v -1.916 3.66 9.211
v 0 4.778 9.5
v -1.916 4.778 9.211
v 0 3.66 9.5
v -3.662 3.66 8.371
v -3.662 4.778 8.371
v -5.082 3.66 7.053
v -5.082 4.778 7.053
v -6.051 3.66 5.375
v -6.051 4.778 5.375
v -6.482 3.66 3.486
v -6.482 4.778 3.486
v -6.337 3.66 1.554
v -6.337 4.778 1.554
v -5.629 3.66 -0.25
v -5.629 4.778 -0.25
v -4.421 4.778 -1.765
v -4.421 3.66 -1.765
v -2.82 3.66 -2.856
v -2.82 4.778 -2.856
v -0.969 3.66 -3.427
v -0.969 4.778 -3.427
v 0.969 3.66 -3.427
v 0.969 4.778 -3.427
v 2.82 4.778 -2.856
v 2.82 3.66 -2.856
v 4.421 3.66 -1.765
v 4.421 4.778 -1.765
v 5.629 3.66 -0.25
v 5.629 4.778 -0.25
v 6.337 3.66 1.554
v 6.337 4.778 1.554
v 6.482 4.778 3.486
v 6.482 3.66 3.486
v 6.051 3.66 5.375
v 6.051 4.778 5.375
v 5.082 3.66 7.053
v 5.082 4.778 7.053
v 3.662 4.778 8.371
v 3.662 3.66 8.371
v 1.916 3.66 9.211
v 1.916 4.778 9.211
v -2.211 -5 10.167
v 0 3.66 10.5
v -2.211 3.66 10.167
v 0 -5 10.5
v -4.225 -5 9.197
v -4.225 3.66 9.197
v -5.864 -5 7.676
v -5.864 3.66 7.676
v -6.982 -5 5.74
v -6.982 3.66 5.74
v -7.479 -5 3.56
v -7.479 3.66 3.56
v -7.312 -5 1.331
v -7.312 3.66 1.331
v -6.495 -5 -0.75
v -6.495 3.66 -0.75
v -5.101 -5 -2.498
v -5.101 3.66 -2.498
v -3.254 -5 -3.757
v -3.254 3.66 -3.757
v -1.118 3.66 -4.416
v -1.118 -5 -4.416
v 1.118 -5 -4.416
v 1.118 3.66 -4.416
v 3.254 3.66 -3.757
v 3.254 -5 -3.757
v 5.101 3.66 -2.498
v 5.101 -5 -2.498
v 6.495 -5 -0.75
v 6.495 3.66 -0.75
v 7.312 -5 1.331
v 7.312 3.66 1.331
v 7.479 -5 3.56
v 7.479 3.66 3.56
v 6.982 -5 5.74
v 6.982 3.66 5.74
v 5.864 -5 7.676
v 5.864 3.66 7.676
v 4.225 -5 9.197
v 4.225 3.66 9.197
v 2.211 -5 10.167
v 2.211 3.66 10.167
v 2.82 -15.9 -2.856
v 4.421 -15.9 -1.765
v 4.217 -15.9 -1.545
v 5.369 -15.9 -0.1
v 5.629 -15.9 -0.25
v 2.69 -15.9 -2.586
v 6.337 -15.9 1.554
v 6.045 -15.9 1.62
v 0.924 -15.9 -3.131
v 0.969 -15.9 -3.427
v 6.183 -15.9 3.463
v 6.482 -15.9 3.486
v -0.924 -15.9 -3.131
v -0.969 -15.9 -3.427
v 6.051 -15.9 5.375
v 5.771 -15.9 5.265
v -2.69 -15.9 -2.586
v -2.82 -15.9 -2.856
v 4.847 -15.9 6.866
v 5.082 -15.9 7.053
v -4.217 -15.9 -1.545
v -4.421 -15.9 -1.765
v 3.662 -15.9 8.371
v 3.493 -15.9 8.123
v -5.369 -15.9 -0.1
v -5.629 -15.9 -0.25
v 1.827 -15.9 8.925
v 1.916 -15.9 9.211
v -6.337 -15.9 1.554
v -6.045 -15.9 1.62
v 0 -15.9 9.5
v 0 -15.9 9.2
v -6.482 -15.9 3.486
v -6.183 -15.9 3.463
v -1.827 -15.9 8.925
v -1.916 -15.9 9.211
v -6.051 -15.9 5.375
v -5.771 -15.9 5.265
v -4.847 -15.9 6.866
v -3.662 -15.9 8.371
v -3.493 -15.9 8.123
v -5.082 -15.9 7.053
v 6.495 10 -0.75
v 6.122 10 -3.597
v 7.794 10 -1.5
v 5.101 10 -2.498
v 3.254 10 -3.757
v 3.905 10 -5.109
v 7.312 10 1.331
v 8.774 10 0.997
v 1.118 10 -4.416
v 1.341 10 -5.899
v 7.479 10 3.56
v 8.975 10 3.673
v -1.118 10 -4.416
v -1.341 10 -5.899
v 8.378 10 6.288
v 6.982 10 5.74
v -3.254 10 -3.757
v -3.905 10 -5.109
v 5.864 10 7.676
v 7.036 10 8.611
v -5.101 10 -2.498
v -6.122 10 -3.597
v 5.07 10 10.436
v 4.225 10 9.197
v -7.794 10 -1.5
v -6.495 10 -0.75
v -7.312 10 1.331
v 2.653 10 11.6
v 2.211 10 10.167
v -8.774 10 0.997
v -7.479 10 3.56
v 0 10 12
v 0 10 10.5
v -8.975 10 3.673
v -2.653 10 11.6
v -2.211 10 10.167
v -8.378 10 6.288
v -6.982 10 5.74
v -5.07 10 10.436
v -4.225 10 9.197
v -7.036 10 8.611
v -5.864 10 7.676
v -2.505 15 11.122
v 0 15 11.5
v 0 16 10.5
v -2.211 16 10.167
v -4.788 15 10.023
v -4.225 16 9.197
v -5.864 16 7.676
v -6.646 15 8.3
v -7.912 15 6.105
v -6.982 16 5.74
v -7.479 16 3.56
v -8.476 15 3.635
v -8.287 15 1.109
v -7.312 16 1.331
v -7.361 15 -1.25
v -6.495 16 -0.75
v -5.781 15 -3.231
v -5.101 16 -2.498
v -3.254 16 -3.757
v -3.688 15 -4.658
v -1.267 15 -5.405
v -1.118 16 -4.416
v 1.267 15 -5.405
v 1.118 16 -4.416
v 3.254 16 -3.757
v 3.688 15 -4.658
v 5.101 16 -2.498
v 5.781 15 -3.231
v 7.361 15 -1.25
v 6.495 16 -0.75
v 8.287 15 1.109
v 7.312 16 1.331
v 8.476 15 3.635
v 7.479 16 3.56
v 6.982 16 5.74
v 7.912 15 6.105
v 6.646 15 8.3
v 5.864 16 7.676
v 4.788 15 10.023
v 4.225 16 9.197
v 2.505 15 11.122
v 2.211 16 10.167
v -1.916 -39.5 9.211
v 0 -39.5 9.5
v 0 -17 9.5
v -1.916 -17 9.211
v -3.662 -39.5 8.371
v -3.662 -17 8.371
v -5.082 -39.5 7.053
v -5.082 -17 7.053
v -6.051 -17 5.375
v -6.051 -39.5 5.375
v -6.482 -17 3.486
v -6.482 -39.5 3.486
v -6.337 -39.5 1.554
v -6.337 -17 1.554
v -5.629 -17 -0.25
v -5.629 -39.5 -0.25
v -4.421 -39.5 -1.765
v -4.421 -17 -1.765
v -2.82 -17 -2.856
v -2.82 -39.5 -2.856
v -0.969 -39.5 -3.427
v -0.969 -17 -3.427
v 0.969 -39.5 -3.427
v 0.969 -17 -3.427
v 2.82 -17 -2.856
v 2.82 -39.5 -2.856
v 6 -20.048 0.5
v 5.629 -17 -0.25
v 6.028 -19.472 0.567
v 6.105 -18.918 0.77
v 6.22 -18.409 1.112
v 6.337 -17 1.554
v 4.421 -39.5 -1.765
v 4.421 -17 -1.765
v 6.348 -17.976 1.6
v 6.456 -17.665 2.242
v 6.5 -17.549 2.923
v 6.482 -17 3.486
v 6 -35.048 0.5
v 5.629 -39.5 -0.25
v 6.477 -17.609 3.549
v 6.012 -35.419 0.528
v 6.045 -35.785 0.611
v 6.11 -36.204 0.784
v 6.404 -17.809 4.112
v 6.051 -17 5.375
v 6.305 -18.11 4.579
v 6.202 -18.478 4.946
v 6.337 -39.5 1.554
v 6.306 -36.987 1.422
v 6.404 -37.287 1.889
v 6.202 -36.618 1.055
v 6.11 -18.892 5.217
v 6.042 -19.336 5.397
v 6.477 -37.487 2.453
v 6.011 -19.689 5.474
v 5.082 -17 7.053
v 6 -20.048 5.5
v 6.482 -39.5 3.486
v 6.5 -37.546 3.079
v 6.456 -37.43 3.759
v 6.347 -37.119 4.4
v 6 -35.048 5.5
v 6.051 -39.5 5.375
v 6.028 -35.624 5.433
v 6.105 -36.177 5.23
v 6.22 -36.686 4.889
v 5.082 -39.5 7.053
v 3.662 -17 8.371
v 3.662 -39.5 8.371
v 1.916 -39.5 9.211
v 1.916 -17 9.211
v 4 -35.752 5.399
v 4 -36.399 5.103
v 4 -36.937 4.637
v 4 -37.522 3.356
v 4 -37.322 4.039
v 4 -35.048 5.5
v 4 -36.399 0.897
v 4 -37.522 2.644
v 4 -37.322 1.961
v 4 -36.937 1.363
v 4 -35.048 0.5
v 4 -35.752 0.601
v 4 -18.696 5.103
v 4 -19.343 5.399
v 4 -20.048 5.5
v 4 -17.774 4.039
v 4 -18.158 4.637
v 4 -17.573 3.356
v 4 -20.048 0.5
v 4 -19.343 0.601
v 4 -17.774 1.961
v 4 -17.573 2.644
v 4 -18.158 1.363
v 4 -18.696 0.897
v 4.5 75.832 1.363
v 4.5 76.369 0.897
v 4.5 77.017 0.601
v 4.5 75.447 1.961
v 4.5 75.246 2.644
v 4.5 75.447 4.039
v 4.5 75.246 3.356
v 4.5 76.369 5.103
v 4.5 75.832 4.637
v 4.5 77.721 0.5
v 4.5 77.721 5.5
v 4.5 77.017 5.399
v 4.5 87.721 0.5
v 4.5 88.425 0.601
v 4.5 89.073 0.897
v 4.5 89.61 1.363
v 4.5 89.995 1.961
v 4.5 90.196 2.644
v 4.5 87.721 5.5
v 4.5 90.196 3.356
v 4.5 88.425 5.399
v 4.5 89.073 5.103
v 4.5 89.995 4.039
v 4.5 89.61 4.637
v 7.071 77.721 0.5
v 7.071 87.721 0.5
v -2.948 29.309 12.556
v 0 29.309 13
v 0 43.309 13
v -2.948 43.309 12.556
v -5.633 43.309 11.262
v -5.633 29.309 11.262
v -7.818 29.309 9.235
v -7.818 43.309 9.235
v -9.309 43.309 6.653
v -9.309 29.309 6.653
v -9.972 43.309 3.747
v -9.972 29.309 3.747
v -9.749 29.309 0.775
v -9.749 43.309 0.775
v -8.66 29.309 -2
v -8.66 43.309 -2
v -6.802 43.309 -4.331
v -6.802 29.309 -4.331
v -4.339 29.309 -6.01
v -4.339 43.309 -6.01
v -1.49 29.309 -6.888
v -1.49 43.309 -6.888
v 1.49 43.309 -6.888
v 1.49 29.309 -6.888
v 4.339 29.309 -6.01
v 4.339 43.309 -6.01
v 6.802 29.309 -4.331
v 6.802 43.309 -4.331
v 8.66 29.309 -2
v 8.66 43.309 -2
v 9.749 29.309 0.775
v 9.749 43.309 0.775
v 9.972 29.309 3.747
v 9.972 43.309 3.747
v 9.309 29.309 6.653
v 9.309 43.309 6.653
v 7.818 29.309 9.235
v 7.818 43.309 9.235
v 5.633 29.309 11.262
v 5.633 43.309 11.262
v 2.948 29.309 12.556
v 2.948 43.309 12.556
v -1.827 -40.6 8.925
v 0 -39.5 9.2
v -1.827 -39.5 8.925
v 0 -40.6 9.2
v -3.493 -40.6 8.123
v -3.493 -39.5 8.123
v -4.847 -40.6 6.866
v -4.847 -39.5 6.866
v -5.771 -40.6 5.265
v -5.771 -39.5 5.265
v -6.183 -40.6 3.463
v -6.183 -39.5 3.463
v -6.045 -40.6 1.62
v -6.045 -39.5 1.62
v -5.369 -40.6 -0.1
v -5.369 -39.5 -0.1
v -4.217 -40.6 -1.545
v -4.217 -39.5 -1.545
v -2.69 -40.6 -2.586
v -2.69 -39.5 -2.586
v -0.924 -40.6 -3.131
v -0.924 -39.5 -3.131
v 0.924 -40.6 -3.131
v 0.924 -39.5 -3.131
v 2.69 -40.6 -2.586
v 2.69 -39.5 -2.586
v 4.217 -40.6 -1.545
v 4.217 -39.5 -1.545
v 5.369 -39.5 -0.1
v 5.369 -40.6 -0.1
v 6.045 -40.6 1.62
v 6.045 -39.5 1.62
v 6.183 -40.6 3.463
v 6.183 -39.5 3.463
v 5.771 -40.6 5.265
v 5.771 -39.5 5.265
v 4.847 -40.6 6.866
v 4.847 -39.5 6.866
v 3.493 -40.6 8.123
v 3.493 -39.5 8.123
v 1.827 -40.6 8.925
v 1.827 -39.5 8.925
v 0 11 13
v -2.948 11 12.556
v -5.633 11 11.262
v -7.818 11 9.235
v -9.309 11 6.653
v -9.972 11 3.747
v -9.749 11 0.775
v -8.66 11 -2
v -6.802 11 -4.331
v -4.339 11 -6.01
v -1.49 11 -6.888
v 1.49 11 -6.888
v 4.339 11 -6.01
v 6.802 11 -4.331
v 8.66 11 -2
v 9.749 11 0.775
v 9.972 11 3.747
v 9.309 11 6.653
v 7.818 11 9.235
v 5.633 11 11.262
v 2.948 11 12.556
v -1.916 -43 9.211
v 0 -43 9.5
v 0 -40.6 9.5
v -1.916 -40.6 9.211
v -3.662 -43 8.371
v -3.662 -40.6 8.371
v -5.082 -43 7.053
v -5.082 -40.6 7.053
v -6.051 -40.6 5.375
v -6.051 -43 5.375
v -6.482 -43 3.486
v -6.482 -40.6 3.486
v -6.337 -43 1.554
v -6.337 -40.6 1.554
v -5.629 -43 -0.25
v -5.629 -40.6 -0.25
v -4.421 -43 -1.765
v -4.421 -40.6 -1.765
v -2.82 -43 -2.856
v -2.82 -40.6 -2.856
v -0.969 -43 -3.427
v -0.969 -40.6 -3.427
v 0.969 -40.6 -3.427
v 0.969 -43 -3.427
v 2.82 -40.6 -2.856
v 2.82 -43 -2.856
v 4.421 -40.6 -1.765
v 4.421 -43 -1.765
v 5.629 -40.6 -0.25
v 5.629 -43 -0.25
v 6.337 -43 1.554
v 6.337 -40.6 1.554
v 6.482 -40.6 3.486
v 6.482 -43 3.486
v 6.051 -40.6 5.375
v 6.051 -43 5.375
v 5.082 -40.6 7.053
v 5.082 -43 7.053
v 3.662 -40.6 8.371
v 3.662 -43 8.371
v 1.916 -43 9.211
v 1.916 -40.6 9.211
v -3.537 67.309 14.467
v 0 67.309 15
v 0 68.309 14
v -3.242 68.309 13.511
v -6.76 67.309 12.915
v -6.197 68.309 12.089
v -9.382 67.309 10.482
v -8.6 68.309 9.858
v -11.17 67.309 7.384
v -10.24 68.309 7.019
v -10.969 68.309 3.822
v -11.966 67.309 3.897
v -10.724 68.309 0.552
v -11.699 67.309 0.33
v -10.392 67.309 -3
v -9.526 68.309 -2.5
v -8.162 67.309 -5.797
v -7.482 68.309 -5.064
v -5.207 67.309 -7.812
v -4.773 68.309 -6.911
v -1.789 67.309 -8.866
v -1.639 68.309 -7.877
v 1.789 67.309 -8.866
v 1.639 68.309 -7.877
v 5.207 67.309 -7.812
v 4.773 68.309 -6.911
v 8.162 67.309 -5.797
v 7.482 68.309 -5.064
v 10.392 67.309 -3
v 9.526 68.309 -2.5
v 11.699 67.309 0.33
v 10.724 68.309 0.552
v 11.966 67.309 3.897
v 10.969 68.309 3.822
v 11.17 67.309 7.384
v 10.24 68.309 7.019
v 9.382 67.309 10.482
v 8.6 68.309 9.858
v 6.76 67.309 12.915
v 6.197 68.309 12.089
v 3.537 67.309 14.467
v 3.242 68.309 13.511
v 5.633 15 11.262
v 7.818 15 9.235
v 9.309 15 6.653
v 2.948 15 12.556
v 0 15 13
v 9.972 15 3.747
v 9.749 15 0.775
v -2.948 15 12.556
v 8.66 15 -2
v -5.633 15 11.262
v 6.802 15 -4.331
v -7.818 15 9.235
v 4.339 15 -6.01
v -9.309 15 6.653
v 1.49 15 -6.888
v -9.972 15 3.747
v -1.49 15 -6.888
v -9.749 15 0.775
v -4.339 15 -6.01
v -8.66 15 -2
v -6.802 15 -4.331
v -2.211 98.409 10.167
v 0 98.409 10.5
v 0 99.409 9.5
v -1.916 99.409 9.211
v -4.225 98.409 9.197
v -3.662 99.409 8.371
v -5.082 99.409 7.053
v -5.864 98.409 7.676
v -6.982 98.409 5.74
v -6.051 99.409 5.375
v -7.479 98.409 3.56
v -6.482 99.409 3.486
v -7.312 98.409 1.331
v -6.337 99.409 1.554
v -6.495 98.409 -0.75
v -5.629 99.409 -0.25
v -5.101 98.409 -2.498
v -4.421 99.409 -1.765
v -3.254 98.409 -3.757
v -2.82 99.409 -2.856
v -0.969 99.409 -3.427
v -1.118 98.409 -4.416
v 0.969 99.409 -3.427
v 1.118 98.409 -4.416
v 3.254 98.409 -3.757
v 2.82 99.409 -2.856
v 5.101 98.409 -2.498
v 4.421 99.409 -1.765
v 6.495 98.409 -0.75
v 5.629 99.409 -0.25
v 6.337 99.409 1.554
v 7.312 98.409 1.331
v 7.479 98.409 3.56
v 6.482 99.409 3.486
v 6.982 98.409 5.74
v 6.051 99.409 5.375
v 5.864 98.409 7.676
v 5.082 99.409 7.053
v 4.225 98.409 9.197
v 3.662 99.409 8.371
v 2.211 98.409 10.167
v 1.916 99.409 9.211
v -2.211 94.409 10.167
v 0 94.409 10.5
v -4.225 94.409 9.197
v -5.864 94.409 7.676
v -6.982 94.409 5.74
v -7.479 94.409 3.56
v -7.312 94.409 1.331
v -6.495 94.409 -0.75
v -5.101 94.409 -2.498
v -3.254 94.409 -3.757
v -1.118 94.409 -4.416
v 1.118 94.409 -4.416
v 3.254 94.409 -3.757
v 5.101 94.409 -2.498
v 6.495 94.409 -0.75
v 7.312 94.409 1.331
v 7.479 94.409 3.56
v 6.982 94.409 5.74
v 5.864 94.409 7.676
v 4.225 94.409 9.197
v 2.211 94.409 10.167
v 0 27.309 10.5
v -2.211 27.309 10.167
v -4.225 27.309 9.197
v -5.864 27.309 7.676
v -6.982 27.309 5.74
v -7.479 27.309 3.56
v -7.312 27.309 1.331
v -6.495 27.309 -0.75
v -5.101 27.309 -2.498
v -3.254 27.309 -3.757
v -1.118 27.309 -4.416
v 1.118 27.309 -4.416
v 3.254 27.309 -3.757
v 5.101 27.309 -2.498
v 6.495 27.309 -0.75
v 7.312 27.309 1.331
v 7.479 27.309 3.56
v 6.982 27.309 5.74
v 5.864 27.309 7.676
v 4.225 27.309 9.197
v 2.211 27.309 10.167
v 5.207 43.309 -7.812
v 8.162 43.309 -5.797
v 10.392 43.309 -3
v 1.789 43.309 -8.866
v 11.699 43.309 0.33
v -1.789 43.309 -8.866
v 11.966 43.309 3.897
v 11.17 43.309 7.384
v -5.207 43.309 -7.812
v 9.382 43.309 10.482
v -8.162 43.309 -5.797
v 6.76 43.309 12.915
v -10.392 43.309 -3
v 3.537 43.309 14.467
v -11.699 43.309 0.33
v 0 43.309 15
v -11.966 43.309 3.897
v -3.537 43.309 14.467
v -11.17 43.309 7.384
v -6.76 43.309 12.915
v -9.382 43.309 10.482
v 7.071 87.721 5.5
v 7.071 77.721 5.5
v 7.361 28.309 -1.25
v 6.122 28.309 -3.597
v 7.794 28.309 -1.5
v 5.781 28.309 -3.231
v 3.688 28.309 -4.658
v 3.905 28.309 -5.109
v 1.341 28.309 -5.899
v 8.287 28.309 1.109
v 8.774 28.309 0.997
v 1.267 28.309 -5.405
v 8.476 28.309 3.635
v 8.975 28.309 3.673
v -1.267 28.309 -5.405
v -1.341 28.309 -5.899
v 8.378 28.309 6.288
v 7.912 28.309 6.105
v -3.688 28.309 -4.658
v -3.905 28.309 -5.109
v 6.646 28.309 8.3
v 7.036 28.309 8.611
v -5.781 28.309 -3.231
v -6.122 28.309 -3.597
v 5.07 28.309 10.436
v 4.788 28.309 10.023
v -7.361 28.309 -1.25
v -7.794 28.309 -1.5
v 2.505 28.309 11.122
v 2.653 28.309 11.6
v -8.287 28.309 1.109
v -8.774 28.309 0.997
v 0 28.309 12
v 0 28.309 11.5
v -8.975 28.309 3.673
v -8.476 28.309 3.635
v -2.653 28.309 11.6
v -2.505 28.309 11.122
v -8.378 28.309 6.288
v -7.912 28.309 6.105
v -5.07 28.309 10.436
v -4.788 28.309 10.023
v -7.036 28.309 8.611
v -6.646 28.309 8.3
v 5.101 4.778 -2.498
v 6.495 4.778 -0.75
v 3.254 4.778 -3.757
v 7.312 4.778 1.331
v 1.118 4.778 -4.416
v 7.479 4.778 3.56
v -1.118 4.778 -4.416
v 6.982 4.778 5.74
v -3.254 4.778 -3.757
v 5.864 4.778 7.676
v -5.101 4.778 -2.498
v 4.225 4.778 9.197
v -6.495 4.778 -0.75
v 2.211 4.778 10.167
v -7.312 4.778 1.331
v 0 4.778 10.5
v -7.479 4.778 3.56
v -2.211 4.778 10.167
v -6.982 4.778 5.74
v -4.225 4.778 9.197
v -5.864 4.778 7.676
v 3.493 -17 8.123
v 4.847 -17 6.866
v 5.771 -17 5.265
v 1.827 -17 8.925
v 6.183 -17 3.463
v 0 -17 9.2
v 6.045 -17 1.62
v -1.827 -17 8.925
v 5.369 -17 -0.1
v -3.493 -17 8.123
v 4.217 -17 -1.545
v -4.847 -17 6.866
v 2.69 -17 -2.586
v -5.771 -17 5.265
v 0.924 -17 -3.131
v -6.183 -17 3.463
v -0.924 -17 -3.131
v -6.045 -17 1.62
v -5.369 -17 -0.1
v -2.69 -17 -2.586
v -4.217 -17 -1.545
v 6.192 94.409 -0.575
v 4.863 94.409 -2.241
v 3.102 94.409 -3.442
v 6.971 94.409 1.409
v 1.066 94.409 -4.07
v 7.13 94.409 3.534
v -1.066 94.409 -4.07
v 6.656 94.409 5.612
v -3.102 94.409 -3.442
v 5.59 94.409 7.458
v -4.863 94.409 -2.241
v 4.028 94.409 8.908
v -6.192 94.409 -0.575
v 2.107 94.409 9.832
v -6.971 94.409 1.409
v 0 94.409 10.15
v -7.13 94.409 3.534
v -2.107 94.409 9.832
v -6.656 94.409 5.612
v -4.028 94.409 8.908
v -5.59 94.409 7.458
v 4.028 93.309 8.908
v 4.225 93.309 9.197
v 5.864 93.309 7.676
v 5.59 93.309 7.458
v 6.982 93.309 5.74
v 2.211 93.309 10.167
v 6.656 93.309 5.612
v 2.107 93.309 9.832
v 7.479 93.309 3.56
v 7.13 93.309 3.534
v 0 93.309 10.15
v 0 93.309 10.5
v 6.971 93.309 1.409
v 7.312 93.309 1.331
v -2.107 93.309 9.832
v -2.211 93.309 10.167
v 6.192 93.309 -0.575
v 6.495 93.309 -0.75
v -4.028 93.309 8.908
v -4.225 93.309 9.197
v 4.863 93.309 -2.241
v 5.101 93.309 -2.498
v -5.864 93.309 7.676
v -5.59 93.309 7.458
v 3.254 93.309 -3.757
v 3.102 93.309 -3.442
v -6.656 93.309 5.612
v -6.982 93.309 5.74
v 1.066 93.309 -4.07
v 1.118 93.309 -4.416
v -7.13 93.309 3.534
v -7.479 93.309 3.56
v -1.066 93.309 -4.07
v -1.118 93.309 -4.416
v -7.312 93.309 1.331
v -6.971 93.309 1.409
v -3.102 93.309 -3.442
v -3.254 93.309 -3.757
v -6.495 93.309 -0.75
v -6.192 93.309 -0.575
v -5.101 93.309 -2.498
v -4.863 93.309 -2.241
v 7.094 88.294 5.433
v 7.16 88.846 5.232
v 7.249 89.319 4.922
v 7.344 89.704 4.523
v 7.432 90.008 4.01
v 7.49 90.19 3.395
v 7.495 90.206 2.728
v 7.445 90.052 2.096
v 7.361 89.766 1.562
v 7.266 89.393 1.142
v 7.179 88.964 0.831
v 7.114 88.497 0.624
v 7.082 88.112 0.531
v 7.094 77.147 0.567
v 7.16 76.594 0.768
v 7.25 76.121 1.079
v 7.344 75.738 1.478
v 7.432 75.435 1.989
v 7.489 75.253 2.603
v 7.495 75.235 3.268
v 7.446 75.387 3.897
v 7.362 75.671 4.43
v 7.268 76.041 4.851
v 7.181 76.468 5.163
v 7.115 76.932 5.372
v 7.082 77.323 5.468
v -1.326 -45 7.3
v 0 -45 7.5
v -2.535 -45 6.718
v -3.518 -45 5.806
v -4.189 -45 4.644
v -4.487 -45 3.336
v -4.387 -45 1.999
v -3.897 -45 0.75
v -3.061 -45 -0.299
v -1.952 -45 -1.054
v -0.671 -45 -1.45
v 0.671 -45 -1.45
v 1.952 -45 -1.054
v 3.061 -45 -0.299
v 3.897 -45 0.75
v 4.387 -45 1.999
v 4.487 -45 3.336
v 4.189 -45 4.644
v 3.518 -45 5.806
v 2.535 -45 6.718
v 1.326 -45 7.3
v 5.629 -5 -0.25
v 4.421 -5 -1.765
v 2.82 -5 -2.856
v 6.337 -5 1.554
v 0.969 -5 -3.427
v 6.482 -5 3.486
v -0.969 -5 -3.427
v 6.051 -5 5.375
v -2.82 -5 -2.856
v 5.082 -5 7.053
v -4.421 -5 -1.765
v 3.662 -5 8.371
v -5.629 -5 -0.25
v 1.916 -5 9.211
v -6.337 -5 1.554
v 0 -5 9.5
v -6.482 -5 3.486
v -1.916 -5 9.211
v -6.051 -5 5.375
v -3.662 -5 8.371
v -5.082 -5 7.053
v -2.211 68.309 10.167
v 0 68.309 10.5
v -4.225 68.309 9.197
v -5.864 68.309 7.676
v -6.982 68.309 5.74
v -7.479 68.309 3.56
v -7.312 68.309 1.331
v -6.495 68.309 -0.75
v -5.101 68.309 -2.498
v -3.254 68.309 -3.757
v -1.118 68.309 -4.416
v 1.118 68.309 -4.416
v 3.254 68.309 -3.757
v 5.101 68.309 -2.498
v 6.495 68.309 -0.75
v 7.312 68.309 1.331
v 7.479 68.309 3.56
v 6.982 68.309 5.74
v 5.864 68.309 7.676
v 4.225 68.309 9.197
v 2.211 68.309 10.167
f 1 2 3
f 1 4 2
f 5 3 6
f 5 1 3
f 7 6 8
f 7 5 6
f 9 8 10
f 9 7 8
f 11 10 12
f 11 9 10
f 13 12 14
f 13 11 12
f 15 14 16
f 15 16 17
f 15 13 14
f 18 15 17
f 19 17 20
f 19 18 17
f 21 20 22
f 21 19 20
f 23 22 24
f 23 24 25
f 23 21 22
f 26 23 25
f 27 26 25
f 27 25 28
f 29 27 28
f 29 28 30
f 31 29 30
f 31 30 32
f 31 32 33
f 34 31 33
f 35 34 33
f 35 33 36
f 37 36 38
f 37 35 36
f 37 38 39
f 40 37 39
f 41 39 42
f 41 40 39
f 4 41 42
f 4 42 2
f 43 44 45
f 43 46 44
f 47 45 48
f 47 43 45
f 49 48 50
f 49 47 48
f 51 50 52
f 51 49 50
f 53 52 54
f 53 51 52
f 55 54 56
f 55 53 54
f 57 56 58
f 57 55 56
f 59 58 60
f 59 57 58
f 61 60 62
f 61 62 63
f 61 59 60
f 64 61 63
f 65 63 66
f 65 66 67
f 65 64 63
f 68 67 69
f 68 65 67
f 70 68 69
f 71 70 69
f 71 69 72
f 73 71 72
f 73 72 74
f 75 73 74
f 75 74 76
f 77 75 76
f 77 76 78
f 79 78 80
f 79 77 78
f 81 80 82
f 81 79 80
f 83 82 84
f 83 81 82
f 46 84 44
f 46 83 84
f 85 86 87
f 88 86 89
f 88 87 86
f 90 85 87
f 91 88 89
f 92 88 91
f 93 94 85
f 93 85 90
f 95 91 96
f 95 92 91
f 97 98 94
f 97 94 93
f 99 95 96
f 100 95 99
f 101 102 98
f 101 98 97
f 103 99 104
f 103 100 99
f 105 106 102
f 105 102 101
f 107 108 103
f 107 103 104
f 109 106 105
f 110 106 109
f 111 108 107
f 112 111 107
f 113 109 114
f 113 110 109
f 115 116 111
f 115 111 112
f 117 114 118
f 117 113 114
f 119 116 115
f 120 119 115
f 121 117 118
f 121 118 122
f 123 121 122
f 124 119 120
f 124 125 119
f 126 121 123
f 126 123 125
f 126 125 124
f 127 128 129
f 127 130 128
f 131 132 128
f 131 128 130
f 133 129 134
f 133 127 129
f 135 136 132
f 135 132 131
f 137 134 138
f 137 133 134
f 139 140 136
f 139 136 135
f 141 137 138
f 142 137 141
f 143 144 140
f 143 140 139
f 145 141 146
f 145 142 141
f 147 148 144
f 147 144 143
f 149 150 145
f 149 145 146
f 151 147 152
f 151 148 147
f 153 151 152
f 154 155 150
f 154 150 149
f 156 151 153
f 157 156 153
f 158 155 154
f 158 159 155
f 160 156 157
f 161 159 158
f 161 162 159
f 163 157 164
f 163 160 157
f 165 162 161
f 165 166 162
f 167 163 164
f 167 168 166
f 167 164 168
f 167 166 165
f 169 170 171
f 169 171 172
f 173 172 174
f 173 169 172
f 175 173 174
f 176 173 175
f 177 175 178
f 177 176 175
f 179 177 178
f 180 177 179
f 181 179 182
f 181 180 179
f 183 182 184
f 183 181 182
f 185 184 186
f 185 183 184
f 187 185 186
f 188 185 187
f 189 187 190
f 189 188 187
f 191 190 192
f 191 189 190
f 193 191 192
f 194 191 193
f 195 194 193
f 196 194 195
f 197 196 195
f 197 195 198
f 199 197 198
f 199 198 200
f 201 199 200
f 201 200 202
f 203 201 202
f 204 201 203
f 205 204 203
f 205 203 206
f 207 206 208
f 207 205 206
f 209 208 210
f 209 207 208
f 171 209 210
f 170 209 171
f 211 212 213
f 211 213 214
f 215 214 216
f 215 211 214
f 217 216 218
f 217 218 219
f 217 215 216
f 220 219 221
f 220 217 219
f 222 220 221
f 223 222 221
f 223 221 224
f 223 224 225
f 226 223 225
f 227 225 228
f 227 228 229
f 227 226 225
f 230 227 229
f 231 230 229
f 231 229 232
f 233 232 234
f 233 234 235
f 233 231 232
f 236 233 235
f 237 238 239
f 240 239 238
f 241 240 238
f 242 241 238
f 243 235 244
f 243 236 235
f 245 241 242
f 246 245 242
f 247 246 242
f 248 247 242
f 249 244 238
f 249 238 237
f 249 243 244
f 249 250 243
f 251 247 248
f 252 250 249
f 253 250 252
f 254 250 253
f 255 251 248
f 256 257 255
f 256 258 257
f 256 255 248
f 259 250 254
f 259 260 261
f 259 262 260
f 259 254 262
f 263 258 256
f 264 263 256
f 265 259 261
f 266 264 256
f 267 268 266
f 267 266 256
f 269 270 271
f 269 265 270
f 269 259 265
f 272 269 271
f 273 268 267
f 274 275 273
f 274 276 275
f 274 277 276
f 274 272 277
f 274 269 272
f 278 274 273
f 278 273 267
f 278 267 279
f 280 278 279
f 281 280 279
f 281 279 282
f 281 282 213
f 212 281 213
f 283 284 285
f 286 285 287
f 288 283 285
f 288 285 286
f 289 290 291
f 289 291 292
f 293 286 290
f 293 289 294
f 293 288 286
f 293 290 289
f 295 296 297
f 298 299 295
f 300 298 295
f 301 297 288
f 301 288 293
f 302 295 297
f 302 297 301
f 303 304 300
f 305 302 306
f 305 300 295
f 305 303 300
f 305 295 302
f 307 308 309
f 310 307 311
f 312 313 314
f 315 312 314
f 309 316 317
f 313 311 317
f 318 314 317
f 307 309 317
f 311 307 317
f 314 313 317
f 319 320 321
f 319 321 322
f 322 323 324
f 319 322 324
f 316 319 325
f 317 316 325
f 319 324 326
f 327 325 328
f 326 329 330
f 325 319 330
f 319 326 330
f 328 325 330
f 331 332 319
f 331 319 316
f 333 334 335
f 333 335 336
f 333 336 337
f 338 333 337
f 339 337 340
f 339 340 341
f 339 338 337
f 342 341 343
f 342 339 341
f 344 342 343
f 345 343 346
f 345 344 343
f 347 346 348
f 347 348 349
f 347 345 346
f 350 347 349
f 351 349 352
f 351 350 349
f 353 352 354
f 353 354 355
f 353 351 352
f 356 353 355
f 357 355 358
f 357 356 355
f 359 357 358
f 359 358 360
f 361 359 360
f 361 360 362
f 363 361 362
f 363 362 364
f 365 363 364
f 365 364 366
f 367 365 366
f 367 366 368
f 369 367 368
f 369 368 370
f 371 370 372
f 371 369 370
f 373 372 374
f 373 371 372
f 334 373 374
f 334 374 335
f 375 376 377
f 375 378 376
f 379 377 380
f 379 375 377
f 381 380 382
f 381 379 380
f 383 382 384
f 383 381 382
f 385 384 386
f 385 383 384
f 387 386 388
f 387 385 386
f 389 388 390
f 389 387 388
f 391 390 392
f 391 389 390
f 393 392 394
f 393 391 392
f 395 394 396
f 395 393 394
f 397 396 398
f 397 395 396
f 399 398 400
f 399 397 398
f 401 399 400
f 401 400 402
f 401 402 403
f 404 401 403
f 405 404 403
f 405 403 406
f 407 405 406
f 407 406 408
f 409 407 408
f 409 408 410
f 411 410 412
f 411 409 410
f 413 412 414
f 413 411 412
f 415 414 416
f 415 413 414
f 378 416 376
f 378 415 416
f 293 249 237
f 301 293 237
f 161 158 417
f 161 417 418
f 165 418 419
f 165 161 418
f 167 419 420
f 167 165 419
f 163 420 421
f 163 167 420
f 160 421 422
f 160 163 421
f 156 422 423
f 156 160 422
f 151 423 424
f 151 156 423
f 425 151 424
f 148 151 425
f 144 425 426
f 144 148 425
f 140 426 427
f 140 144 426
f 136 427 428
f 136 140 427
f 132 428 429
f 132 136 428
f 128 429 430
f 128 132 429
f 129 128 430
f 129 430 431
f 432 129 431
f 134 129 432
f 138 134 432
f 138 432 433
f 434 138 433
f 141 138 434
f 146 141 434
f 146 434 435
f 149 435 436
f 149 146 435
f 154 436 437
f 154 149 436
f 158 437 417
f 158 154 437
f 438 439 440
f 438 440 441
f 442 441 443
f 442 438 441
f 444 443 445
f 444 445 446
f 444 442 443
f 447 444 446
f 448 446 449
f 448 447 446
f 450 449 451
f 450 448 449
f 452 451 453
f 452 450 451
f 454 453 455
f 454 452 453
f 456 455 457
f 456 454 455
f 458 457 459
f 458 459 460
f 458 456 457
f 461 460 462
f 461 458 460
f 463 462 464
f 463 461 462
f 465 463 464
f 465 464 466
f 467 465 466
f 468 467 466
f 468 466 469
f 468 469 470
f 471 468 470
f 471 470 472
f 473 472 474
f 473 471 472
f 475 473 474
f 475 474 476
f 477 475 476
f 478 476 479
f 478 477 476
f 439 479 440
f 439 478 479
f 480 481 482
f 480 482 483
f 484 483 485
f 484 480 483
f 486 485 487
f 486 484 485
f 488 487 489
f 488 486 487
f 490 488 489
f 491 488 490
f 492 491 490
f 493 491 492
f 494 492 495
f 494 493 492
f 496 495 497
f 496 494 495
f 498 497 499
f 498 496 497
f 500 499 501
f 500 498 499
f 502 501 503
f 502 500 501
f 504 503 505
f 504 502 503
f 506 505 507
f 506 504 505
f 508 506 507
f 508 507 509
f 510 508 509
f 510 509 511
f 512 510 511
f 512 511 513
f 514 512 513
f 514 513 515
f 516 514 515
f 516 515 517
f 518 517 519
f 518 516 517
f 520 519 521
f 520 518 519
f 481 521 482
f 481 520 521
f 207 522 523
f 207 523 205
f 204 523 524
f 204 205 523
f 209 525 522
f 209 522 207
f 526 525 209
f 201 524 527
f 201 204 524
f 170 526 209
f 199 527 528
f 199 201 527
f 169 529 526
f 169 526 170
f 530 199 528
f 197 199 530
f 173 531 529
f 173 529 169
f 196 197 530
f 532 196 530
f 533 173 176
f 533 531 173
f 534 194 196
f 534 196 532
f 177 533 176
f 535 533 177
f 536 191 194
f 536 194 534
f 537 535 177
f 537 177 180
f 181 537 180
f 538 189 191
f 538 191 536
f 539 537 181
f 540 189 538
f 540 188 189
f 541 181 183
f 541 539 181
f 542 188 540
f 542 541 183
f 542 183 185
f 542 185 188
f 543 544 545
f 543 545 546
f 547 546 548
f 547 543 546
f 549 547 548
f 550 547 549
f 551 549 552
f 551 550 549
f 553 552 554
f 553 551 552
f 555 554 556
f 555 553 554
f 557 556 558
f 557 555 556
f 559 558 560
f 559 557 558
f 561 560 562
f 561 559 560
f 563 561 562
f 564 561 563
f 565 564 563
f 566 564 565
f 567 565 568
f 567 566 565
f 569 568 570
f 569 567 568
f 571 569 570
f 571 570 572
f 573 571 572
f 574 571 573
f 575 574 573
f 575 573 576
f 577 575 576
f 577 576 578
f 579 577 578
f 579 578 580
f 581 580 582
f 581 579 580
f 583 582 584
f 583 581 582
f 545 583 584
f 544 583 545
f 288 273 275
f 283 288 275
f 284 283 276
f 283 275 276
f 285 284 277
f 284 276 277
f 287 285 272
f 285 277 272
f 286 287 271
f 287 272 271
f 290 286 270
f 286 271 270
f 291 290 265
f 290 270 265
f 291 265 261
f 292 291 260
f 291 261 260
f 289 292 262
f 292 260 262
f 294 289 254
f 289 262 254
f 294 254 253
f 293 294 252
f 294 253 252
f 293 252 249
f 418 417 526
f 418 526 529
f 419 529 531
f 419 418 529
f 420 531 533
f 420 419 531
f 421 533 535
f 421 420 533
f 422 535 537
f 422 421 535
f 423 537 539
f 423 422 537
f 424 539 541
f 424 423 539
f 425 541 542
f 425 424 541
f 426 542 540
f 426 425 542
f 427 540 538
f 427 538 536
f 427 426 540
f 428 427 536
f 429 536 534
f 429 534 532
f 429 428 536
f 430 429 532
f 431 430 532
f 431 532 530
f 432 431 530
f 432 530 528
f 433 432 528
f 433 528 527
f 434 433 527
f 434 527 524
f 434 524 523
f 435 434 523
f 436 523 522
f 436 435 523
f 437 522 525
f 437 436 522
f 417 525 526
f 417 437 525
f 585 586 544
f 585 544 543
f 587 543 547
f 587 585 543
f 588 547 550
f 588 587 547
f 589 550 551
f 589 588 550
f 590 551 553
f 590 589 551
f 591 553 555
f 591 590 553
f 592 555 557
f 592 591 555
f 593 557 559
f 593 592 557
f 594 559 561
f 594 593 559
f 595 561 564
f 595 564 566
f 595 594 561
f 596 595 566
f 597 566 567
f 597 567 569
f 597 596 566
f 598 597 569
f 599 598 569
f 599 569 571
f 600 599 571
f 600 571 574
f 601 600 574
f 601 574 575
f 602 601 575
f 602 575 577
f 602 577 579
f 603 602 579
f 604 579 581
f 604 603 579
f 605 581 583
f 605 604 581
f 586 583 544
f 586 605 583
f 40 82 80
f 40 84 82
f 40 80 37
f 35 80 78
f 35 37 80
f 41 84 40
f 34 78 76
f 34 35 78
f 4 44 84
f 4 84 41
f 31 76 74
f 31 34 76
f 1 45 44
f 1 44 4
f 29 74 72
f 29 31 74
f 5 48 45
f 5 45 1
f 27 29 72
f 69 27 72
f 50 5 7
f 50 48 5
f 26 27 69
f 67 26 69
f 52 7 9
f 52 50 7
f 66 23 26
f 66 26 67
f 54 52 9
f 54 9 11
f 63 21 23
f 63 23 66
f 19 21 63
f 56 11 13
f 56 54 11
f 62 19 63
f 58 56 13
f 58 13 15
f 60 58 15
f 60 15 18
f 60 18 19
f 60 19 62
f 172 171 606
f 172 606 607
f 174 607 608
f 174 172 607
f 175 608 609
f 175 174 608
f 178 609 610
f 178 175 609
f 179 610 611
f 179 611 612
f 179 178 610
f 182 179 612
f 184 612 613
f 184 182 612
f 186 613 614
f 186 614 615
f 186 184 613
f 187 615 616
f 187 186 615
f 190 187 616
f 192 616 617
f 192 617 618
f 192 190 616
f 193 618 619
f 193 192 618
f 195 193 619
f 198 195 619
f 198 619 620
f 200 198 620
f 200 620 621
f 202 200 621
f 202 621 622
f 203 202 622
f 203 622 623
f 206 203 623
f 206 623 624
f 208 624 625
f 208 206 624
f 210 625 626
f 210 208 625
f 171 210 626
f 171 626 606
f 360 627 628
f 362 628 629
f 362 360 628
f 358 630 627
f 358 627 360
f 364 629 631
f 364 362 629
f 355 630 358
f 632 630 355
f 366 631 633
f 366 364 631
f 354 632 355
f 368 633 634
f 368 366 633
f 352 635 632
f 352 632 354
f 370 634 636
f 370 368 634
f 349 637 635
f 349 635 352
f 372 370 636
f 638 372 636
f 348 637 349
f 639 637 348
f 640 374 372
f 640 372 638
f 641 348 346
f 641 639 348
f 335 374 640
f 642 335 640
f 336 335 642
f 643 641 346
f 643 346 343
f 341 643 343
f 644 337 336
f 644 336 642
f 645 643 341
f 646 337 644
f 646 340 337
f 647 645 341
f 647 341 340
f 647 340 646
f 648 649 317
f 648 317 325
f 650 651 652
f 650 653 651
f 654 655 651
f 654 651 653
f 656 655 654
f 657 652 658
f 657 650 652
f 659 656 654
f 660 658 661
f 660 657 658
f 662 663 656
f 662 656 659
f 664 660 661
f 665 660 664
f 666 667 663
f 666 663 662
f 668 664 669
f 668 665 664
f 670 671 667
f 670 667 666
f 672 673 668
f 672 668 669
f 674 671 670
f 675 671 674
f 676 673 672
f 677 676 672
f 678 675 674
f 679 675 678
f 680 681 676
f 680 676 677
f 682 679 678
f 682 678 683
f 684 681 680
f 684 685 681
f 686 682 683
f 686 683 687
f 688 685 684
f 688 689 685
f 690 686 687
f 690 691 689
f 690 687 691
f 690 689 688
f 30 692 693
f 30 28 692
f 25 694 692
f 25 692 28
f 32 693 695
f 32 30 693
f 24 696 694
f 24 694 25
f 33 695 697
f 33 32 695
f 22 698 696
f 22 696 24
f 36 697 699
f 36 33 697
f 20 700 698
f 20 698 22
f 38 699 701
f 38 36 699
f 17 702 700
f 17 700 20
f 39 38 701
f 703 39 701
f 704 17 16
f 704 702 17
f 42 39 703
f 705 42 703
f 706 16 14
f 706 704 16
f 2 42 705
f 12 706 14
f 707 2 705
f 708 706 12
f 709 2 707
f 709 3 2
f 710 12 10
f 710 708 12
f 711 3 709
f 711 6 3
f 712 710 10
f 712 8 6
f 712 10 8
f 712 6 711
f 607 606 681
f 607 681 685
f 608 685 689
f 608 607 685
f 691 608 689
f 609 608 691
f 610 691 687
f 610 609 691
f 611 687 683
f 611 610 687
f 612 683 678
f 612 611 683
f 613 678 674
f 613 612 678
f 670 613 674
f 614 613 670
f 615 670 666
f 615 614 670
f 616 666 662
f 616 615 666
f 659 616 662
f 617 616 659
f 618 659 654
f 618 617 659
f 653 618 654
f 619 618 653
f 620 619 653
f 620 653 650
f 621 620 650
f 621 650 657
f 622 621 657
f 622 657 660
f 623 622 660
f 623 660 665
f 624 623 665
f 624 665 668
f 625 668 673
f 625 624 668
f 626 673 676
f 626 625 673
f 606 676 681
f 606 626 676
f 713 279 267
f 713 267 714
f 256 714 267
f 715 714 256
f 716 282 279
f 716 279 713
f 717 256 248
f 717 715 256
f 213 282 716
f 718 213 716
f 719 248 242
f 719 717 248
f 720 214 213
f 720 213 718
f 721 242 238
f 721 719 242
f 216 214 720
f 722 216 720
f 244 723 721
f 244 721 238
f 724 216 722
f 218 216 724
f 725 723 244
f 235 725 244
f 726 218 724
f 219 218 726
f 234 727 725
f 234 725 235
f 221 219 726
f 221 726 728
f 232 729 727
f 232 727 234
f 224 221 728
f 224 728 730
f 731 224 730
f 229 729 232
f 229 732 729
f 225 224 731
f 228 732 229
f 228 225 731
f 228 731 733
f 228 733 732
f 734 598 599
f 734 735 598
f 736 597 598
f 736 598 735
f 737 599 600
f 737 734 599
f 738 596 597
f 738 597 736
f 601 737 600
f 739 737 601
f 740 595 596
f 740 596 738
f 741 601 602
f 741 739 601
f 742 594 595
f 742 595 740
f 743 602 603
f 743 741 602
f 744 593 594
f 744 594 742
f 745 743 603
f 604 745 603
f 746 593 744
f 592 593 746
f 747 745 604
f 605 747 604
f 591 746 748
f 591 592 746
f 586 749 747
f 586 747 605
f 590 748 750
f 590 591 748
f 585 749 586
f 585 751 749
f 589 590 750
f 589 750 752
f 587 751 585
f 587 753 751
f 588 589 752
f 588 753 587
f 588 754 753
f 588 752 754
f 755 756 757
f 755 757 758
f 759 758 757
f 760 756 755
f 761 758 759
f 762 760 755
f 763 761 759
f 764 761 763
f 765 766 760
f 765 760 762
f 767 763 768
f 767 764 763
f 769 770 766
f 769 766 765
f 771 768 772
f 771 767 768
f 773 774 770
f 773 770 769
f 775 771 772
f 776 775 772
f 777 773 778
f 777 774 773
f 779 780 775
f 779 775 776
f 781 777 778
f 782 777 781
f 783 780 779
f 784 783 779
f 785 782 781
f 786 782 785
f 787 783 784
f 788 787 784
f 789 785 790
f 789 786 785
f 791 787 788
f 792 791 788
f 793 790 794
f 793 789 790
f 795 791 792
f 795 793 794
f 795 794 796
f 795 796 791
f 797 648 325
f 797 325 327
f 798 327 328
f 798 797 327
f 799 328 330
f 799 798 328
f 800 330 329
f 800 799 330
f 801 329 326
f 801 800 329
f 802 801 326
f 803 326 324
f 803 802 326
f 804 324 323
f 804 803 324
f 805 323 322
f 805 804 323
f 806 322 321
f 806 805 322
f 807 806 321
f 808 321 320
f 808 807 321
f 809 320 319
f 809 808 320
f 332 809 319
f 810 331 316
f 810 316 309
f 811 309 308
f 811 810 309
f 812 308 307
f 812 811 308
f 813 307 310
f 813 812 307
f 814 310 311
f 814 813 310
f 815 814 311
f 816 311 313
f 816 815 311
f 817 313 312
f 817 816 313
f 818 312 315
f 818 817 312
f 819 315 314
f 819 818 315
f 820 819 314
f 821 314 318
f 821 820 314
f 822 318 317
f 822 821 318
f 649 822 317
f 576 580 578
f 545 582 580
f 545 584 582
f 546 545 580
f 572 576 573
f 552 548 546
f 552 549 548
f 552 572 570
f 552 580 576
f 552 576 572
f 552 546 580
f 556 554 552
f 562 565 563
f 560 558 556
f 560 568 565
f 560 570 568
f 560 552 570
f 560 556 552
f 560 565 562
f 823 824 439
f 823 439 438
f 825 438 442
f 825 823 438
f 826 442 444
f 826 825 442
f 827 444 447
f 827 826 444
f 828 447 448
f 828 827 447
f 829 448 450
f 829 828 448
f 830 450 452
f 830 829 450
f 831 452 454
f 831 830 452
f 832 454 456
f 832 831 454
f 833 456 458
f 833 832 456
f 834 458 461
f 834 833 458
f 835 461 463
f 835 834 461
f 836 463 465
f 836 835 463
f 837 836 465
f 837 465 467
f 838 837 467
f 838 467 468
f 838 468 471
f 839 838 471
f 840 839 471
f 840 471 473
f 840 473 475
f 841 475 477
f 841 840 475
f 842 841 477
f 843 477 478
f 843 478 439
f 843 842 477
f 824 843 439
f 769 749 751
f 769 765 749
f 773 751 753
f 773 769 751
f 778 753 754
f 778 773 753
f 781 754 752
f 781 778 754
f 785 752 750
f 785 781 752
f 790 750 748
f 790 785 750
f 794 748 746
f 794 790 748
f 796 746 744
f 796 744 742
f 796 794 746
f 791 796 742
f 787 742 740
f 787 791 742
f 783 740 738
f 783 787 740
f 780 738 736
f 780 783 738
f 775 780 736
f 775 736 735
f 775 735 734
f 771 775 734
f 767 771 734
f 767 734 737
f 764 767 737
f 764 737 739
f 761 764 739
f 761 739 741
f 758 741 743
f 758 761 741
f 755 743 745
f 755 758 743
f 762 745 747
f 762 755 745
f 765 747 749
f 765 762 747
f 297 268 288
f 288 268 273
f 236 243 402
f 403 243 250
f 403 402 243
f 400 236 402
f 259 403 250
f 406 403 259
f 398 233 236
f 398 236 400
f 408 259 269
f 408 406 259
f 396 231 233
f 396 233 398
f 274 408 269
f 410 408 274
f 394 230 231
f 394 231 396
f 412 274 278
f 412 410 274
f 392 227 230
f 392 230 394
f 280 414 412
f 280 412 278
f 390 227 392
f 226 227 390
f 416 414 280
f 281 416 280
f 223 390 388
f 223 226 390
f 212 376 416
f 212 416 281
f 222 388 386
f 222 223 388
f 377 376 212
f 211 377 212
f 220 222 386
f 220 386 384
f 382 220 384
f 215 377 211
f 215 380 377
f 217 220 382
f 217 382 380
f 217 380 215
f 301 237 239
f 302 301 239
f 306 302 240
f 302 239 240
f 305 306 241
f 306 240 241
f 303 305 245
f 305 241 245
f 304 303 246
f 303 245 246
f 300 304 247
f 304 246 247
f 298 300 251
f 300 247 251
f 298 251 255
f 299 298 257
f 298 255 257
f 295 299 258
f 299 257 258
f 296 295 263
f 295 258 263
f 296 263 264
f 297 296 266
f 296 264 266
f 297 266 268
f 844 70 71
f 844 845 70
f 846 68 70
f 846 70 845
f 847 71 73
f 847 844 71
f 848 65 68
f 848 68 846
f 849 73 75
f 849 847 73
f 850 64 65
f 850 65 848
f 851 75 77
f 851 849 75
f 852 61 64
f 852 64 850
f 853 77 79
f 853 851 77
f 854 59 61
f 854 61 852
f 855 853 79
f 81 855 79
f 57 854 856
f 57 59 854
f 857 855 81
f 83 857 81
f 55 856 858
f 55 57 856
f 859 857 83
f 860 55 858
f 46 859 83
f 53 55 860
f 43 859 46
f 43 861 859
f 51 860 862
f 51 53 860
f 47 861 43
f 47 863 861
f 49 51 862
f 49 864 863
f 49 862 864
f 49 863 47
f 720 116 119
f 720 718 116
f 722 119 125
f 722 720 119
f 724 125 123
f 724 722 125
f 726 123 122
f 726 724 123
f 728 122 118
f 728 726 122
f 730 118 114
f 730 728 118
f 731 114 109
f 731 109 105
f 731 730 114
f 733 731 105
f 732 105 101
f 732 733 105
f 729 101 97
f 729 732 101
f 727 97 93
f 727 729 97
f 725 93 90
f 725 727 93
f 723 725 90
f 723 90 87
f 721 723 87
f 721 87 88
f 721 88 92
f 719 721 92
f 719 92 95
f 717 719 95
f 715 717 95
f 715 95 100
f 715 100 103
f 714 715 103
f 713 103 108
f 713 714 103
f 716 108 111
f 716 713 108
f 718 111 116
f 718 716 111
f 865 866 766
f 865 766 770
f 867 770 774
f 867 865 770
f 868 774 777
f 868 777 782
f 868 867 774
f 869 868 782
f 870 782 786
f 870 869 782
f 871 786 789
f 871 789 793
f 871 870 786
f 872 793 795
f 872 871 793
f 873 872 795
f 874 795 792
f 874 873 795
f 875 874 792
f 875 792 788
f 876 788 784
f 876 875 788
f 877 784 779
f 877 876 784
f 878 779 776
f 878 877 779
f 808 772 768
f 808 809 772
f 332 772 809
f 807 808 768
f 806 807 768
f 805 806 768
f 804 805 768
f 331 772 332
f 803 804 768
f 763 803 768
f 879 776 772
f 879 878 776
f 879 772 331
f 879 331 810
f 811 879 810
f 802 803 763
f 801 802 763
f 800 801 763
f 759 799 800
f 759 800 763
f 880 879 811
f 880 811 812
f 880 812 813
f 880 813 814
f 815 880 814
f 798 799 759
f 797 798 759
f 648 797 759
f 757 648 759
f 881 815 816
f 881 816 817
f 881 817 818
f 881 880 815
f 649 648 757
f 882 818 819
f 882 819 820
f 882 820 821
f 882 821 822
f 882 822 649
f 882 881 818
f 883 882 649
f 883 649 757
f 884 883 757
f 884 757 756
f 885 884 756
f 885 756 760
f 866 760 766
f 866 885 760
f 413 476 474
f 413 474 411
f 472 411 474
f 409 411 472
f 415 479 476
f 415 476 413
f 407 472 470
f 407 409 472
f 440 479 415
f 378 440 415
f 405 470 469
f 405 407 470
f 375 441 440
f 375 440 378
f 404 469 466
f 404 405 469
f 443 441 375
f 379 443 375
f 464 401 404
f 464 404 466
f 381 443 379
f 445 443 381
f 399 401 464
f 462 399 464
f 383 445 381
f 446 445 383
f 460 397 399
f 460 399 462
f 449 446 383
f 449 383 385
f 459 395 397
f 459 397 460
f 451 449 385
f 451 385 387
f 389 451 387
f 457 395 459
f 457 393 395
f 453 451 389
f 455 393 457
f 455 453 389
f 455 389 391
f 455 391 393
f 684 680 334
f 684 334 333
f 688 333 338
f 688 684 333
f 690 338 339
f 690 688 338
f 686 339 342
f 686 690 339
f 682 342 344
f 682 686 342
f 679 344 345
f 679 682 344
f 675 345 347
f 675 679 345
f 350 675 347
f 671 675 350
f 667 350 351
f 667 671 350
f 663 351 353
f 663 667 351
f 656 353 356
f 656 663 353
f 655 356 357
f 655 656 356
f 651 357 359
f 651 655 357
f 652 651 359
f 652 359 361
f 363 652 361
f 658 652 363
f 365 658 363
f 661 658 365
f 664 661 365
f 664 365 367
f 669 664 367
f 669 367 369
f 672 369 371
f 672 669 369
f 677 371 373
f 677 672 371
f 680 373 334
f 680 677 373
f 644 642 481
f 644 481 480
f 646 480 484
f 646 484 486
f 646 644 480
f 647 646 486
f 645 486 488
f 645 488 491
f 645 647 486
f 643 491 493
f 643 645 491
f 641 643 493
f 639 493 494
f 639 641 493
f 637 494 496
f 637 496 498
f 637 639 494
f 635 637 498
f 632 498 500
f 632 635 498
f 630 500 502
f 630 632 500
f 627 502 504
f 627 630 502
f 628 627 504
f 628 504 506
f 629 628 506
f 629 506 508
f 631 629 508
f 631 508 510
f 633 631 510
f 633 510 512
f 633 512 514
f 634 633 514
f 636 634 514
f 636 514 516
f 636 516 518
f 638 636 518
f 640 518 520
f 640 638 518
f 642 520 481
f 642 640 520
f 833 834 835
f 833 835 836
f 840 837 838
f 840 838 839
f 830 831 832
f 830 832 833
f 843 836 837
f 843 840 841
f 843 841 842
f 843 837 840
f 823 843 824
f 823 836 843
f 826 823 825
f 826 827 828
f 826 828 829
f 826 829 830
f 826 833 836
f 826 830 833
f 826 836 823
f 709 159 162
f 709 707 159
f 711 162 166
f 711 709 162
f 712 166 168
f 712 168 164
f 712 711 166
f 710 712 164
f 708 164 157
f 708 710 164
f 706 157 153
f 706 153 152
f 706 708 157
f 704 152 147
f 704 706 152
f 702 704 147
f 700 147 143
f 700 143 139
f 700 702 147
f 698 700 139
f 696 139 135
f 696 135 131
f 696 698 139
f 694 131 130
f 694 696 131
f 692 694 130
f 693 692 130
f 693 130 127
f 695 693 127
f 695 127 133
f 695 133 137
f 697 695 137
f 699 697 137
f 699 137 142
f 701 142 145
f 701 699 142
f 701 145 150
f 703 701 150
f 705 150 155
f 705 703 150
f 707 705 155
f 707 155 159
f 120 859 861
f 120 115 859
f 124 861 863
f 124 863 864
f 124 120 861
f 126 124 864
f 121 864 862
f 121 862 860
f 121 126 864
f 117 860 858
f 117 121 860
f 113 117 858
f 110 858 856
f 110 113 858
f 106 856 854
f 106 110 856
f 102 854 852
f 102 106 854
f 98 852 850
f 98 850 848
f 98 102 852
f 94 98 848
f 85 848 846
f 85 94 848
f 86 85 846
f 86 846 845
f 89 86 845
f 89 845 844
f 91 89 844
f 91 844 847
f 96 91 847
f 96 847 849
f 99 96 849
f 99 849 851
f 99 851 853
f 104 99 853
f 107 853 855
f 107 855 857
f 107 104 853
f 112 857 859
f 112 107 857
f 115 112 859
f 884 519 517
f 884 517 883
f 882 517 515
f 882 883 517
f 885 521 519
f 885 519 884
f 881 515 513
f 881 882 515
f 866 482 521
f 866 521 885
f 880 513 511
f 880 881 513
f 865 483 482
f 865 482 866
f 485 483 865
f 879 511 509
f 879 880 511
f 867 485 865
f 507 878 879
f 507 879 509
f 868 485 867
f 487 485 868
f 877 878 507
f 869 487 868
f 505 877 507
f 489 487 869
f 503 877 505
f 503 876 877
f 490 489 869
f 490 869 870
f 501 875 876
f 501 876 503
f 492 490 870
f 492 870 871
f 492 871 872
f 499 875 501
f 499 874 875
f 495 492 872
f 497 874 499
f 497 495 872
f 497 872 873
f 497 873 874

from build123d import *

# Parameters (mm, degrees)
SFAZOWANIE2_SIZE           = 1
WYTNIJ_WYCI_GNI_CIE1_DEPTH = 5.5
WYTNIJ_WYCI_GNI_CIE2_DEPTH = 6
SFAZOWANIE3_SIZE           = 2


with BuildPart() as part:
    # Szkic1 → Obr_t1 (revolve)
    with BuildSketch(Plane(origin=(0, 0, 0), x_dir=(0, 0, -1), z_dir=(1, 0, 0))):
        Polygon((-3, -6.188308688), (-3, 99.409284105), (-10.5, 99.409284105), (-10.5, 94.409284105), (-10.15, 94.409284105), (-10.15, 93.309284105), (-10.5, 93.309284105), (-10.5, 68.309284105), (-15, 68.309284105), (-15, 43.309284105), (-13, 43.309284105), (-13, 28.309284105), (-10.5, 28.309284105), (-10.5, 15), (-13, 15), (-13, 10), (-10.5, 10), (-10.5, 4.778207376), (-9.5, 4.778207376), (-9.5, 3.660040364), (-10.5, 3.660040364), (-10.5, -5), (-9.5, -5), (-9.5, -15.9), (-9.2, -15.9), (-9.2, -17), (-9.5, -17), (-9.5, -39.5), (-9.2, -39.5), (-9.2, -40.6), (-9.5, -40.6), (-9.5, -45), (-3, -45), (-3, -6.690715895), align=None)
    revolve(axis=Axis((0, 99.409284105, 3), (0, -1, 0)))

    # Sfazowanie2
    sfazowanie2_edges = [part.edges().sort_by_distance(p)[0] for p in [
        (0, 10, -7),
        (0, 15, -4.5),
        (0, 28.309284105, -4.5),
        (0, 28.309284105, -7),
        (0, 68.309284105, -9),
        (0, 99.409284105, -4.5),
    ]]
    chamfer(sfazowanie2_edges, length=SFAZOWANIE2_SIZE)

    # Szkic2 → Wytnij-wyci_gni_cie1 (cut)
    with BuildSketch(Plane(origin=(10, 0, 0), x_dir=(0, 0, -1), z_dir=(1, 0, 0))):
        with BuildLine():
            Line((-0.5, 87.721044176), (-0.5, 77.721044176))
            ThreePointArc((-0.5, 77.721044176), (-3, 75.221044176), (-5.5, 77.721044176))
            Line((-5.5, 77.721044176), (-5.5, 87.721044176))
            ThreePointArc((-5.5, 87.721044176), (-3, 90.221044176), (-0.5, 87.721044176))
        make_face()
    extrude(amount=-WYTNIJ_WYCI_GNI_CIE1_DEPTH, mode=Mode.SUBTRACT)

    # Szkic2_4 → Wytnij-wyci_gni_cie2 (cut)
    with BuildSketch(Plane(origin=(10, 0, 0), x_dir=(0, 0, -1), z_dir=(1, 0, 0))):
        with BuildLine():
            Line((-5.5, -20.047619848), (-5.5, -35.047619848))
            ThreePointArc((-5.5, -35.047619848), (-3, -37.547619848), (-0.5, -35.047619848))
            Line((-0.5, -35.047619848), (-0.5, -20.047619848))
            ThreePointArc((-0.5, -20.047619848), (-3, -17.547619848), (-5.5, -20.047619848))
        make_face()
    extrude(amount=-WYTNIJ_WYCI_GNI_CIE2_DEPTH, mode=Mode.SUBTRACT)

    # Sfazowanie3
    sfazowanie3_edges = [part.edges().sort_by_distance(p)[0] for p in [
        (0, -45, -3.5),
    ]]
    chamfer(sfazowanie3_edges, length=SFAZOWANIE3_SIZE)


solid = part.part
